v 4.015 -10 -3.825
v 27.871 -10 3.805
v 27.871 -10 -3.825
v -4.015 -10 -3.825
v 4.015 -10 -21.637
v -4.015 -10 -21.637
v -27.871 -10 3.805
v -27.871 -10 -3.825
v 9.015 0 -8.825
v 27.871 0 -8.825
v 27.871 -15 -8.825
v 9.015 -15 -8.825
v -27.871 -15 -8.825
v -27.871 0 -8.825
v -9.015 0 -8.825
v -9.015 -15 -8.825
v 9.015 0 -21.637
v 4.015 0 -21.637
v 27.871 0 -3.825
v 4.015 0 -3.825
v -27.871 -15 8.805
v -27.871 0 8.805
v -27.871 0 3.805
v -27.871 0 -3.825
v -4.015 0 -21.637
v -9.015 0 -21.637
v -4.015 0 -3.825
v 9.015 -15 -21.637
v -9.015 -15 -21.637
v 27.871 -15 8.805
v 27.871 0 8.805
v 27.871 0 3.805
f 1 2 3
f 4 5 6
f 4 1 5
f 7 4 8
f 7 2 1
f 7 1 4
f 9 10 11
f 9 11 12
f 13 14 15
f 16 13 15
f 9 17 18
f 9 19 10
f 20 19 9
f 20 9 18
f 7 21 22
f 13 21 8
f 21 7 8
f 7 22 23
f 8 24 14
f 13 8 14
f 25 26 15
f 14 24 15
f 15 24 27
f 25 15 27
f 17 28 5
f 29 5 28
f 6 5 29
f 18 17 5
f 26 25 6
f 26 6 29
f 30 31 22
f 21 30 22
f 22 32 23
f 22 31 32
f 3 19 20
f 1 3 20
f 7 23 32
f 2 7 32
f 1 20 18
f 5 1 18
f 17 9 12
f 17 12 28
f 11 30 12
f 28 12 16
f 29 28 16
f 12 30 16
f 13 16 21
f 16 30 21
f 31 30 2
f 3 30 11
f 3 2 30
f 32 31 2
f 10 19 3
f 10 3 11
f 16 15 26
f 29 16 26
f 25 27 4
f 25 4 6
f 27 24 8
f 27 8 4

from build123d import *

# Parameters (mm, degrees)
F0_W     = 27.871466
F0_H     = 5
F1_DEPTH = 15
F2_DEPTH = 10


with BuildPart() as f1:
    # F0 (on Front) → F1 (new body)
    with BuildSketch(Plane.XZ):
        Polygon((-4.015, -21.636724), (0, -21.636724), (0, 0), (0, 3.805), (-27.871466, 3.805), (-27.871466, 0), (-27.871466, -3.825), (-4.015, -3.825), align=None)
        Polygon((-9.015, -21.636724), (-4.015, -21.636724), (-4.015, -3.825), (-27.871466, -3.825), (-27.871466, -8.825), (-9.015, -8.825), align=None)
        with Locations((-13.935733, 6.305)):
            Rectangle(F0_W, F0_H)
    extrude(amount=F1_DEPTH)

    # F0 (on Front) → F2 (cut)
    with BuildSketch(Plane.XZ):
        Polygon((-4.015, -21.636724), (0, -21.636724), (0, 0), (0, 3.805), (-27.871466, 3.805), (-27.871466, 0), (-27.871466, -3.825), (-4.015, -3.825), align=None)
    extrude(amount=F2_DEPTH, mode=Mode.SUBTRACT)

    # F3: F1 across plane


with BuildPart() as f1_1:
    add(f1.part)
    add(f1.part.mirror(Plane.YZ))


solid = f1_1.part
